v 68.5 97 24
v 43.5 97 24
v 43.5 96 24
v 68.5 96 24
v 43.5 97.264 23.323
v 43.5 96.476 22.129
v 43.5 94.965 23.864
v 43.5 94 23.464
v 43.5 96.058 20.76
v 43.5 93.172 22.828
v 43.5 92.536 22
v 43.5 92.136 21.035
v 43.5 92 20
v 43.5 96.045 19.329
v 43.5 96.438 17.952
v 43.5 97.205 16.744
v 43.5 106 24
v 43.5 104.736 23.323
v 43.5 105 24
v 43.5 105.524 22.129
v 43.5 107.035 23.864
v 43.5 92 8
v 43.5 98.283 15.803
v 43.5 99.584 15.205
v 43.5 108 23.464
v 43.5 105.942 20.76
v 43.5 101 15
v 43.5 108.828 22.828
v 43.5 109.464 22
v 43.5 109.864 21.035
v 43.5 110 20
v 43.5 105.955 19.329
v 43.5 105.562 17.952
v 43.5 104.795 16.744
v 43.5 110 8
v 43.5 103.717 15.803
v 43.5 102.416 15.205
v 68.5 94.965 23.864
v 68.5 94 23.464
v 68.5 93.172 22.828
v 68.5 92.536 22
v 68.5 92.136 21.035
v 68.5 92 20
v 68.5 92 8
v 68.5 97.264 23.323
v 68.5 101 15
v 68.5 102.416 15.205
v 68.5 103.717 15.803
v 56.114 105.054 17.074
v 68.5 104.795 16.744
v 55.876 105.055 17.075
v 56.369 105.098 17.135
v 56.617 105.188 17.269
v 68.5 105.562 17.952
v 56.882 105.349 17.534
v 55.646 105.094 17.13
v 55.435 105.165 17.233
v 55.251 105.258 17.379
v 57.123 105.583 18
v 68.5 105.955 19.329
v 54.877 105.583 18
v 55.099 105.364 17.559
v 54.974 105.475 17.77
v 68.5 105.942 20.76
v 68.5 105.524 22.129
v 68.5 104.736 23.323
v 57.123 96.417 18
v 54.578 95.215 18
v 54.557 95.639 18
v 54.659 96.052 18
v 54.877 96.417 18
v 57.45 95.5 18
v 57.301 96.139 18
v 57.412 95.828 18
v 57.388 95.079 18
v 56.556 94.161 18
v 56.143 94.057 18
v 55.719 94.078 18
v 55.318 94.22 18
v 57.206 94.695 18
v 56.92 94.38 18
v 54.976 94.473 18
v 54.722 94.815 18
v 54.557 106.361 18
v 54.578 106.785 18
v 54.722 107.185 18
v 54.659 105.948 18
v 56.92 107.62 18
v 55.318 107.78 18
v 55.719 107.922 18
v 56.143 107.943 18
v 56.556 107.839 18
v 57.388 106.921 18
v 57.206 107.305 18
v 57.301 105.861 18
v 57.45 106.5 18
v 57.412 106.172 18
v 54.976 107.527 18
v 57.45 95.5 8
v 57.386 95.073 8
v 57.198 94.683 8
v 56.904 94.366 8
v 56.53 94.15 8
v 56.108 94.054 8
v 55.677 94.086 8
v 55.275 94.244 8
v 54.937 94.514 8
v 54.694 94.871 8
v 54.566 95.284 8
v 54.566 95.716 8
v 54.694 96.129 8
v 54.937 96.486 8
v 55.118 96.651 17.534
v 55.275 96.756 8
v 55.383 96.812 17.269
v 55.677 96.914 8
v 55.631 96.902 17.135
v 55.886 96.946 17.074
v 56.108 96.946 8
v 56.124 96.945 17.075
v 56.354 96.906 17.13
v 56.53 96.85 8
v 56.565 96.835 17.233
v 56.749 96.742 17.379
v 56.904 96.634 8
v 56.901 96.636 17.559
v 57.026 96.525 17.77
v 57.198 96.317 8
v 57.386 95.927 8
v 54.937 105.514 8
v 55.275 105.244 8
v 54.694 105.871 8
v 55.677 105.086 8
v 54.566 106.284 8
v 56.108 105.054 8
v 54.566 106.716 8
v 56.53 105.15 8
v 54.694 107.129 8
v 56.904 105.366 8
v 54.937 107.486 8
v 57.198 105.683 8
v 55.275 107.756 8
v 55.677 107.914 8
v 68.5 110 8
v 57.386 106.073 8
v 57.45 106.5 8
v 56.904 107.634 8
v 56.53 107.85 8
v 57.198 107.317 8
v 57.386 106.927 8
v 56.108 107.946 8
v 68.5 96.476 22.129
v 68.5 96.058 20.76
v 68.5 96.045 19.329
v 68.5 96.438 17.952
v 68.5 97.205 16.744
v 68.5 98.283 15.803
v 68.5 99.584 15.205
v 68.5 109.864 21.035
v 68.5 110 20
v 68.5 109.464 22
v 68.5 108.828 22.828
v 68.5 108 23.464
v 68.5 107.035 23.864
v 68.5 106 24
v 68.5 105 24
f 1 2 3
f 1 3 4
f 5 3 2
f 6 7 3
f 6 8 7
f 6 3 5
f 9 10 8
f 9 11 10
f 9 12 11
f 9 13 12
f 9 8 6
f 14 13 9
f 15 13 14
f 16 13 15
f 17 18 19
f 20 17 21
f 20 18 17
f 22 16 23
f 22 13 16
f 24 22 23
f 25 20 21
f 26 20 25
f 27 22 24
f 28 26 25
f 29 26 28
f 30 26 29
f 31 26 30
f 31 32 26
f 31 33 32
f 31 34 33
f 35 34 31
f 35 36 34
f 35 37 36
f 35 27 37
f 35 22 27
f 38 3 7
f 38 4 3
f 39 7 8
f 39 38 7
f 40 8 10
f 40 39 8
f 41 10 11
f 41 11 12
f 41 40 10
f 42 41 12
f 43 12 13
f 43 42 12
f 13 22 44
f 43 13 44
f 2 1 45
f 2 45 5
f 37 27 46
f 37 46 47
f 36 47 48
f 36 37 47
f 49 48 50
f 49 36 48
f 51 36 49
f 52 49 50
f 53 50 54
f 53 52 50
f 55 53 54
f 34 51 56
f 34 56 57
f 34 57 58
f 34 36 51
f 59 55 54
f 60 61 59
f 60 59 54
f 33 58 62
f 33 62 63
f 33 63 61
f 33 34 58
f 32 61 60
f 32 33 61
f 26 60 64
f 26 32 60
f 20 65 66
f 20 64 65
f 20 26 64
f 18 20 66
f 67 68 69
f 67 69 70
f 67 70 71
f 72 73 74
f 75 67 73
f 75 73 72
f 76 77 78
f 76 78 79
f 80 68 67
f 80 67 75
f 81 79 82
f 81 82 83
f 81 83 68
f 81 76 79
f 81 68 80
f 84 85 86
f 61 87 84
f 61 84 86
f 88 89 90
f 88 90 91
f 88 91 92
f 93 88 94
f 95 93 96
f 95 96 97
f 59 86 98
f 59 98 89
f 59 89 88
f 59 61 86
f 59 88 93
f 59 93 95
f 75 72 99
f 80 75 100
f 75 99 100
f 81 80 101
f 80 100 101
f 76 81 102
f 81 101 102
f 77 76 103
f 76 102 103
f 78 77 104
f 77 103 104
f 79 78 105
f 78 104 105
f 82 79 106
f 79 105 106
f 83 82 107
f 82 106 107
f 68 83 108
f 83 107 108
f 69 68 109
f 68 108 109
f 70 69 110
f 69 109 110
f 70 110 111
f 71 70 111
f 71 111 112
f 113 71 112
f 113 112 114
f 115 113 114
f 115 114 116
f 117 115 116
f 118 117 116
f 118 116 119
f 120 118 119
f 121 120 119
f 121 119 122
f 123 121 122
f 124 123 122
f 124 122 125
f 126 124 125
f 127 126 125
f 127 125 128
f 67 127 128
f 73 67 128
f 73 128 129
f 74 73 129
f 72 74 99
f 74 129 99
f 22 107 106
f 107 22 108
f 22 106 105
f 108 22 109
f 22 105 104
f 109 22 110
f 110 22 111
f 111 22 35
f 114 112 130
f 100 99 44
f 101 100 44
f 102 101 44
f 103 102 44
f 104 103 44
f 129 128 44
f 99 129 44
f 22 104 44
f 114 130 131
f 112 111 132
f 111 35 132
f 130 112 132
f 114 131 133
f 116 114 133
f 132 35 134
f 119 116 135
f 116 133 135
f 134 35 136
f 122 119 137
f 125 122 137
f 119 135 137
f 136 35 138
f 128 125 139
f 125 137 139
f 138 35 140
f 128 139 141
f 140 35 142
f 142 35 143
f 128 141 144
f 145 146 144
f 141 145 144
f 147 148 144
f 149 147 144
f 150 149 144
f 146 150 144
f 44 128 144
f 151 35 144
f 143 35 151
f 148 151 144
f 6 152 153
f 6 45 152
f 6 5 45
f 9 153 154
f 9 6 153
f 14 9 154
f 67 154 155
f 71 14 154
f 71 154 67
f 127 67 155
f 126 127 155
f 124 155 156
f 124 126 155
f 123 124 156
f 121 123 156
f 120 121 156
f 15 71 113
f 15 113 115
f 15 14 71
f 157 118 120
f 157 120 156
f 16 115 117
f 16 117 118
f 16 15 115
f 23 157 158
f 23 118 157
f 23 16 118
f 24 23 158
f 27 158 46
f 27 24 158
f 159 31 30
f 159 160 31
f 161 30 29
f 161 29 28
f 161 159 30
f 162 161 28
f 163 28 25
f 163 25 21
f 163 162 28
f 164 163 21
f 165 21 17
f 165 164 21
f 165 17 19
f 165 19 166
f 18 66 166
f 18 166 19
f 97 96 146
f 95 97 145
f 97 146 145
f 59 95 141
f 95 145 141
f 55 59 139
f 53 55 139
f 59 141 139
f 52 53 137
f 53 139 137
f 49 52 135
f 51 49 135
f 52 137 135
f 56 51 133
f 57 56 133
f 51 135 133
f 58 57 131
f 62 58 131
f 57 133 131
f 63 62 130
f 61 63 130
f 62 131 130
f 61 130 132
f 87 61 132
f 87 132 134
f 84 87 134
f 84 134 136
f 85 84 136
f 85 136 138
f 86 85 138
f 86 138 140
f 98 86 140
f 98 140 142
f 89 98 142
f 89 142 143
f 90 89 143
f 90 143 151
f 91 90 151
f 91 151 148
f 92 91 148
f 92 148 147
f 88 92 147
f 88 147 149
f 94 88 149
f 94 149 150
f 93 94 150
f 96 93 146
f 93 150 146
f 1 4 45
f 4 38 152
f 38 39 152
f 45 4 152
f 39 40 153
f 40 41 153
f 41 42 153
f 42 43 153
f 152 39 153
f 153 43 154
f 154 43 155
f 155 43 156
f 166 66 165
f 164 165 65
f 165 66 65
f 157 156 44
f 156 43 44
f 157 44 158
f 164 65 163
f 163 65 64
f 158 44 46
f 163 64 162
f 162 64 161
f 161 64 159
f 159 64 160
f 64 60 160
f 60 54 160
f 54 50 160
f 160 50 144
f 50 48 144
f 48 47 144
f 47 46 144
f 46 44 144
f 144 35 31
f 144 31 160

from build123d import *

# Parameters (mm, degrees)
CYLINDER_R           = 5
CYLINDER_DEPTH       = 200
CYLINDER_PITCH_ANGLE = 90
BOX004_W             = 25
BOX004_H             = 18
BOX004_DEPTH         = 16
SKETCH005_R          = 1.45
POCKET005_DEPTH      = 10
FILLET001_R          = 4
CHAMFER003_SIZE      = 1


with BuildPart() as cylinder:
    # Cylinder → Cylinder (new body)
    with BuildSketch(Plane.XY):
        Circle(CYLINDER_R)
    extrude(amount=CYLINDER_DEPTH)


with BuildPart() as cylinder_1:
    # Cylinder pitch: moved
    add(cylinder.part.rotate(Axis((0, 0, 0), (0, 1, 0)), CYLINDER_PITCH_ANGLE))


with BuildPart() as cylinder_2:
    # Cylinder placement: moved
    add(cylinder_1.part.moved(Location((0, 121, 20))))


with BuildPart() as chamfer003:
    # Box004 → Box004 (new body)
    with BuildSketch(Plane(origin=(43.5, 112, 8), x_dir=(1, 0, 0), z_dir=(0, 0, 1))):
        with Locations((12.5, 9)):
            Rectangle(BOX004_W, BOX004_H)
    extrude(amount=BOX004_DEPTH)

    # Sketch005 → Pocket005 (cut)
    with BuildSketch(Plane(origin=(43.5, 112, 8), x_dir=(1, 0, 0), z_dir=(0, 0, -1))):
        with Locations((12.5, -3.5)):
            Circle(SKETCH005_R)
        with Locations((12.5, -14.5)):
            Circle(SKETCH005_R)
    extrude(amount=-POCKET005_DEPTH, mode=Mode.SUBTRACT)

    # Cut: cut Cylinder
    add(cylinder_2.part, mode=Mode.SUBTRACT)


with BuildPart() as chamfer003_1:
    # Cut placement: moved
    add(chamfer003.part.moved(Location((0, -20, 0))))

    # Fillet001
    fillet001_edges = [chamfer003_1.edges().sort_by_distance(p)[0] for p in [
        (56, 110, 24),
        (56, 92, 24),
    ]]
    fillet(fillet001_edges, radius=FILLET001_R)

    # Chamfer003
    chamfer003_edges = [chamfer003_1.edges().sort_by_distance(p)[0] for p in [
        (56, 104, 24),
        (56, 98, 24),
    ]]
    chamfer(chamfer003_edges, length=CHAMFER003_SIZE)


solid = chamfer003_1.part
